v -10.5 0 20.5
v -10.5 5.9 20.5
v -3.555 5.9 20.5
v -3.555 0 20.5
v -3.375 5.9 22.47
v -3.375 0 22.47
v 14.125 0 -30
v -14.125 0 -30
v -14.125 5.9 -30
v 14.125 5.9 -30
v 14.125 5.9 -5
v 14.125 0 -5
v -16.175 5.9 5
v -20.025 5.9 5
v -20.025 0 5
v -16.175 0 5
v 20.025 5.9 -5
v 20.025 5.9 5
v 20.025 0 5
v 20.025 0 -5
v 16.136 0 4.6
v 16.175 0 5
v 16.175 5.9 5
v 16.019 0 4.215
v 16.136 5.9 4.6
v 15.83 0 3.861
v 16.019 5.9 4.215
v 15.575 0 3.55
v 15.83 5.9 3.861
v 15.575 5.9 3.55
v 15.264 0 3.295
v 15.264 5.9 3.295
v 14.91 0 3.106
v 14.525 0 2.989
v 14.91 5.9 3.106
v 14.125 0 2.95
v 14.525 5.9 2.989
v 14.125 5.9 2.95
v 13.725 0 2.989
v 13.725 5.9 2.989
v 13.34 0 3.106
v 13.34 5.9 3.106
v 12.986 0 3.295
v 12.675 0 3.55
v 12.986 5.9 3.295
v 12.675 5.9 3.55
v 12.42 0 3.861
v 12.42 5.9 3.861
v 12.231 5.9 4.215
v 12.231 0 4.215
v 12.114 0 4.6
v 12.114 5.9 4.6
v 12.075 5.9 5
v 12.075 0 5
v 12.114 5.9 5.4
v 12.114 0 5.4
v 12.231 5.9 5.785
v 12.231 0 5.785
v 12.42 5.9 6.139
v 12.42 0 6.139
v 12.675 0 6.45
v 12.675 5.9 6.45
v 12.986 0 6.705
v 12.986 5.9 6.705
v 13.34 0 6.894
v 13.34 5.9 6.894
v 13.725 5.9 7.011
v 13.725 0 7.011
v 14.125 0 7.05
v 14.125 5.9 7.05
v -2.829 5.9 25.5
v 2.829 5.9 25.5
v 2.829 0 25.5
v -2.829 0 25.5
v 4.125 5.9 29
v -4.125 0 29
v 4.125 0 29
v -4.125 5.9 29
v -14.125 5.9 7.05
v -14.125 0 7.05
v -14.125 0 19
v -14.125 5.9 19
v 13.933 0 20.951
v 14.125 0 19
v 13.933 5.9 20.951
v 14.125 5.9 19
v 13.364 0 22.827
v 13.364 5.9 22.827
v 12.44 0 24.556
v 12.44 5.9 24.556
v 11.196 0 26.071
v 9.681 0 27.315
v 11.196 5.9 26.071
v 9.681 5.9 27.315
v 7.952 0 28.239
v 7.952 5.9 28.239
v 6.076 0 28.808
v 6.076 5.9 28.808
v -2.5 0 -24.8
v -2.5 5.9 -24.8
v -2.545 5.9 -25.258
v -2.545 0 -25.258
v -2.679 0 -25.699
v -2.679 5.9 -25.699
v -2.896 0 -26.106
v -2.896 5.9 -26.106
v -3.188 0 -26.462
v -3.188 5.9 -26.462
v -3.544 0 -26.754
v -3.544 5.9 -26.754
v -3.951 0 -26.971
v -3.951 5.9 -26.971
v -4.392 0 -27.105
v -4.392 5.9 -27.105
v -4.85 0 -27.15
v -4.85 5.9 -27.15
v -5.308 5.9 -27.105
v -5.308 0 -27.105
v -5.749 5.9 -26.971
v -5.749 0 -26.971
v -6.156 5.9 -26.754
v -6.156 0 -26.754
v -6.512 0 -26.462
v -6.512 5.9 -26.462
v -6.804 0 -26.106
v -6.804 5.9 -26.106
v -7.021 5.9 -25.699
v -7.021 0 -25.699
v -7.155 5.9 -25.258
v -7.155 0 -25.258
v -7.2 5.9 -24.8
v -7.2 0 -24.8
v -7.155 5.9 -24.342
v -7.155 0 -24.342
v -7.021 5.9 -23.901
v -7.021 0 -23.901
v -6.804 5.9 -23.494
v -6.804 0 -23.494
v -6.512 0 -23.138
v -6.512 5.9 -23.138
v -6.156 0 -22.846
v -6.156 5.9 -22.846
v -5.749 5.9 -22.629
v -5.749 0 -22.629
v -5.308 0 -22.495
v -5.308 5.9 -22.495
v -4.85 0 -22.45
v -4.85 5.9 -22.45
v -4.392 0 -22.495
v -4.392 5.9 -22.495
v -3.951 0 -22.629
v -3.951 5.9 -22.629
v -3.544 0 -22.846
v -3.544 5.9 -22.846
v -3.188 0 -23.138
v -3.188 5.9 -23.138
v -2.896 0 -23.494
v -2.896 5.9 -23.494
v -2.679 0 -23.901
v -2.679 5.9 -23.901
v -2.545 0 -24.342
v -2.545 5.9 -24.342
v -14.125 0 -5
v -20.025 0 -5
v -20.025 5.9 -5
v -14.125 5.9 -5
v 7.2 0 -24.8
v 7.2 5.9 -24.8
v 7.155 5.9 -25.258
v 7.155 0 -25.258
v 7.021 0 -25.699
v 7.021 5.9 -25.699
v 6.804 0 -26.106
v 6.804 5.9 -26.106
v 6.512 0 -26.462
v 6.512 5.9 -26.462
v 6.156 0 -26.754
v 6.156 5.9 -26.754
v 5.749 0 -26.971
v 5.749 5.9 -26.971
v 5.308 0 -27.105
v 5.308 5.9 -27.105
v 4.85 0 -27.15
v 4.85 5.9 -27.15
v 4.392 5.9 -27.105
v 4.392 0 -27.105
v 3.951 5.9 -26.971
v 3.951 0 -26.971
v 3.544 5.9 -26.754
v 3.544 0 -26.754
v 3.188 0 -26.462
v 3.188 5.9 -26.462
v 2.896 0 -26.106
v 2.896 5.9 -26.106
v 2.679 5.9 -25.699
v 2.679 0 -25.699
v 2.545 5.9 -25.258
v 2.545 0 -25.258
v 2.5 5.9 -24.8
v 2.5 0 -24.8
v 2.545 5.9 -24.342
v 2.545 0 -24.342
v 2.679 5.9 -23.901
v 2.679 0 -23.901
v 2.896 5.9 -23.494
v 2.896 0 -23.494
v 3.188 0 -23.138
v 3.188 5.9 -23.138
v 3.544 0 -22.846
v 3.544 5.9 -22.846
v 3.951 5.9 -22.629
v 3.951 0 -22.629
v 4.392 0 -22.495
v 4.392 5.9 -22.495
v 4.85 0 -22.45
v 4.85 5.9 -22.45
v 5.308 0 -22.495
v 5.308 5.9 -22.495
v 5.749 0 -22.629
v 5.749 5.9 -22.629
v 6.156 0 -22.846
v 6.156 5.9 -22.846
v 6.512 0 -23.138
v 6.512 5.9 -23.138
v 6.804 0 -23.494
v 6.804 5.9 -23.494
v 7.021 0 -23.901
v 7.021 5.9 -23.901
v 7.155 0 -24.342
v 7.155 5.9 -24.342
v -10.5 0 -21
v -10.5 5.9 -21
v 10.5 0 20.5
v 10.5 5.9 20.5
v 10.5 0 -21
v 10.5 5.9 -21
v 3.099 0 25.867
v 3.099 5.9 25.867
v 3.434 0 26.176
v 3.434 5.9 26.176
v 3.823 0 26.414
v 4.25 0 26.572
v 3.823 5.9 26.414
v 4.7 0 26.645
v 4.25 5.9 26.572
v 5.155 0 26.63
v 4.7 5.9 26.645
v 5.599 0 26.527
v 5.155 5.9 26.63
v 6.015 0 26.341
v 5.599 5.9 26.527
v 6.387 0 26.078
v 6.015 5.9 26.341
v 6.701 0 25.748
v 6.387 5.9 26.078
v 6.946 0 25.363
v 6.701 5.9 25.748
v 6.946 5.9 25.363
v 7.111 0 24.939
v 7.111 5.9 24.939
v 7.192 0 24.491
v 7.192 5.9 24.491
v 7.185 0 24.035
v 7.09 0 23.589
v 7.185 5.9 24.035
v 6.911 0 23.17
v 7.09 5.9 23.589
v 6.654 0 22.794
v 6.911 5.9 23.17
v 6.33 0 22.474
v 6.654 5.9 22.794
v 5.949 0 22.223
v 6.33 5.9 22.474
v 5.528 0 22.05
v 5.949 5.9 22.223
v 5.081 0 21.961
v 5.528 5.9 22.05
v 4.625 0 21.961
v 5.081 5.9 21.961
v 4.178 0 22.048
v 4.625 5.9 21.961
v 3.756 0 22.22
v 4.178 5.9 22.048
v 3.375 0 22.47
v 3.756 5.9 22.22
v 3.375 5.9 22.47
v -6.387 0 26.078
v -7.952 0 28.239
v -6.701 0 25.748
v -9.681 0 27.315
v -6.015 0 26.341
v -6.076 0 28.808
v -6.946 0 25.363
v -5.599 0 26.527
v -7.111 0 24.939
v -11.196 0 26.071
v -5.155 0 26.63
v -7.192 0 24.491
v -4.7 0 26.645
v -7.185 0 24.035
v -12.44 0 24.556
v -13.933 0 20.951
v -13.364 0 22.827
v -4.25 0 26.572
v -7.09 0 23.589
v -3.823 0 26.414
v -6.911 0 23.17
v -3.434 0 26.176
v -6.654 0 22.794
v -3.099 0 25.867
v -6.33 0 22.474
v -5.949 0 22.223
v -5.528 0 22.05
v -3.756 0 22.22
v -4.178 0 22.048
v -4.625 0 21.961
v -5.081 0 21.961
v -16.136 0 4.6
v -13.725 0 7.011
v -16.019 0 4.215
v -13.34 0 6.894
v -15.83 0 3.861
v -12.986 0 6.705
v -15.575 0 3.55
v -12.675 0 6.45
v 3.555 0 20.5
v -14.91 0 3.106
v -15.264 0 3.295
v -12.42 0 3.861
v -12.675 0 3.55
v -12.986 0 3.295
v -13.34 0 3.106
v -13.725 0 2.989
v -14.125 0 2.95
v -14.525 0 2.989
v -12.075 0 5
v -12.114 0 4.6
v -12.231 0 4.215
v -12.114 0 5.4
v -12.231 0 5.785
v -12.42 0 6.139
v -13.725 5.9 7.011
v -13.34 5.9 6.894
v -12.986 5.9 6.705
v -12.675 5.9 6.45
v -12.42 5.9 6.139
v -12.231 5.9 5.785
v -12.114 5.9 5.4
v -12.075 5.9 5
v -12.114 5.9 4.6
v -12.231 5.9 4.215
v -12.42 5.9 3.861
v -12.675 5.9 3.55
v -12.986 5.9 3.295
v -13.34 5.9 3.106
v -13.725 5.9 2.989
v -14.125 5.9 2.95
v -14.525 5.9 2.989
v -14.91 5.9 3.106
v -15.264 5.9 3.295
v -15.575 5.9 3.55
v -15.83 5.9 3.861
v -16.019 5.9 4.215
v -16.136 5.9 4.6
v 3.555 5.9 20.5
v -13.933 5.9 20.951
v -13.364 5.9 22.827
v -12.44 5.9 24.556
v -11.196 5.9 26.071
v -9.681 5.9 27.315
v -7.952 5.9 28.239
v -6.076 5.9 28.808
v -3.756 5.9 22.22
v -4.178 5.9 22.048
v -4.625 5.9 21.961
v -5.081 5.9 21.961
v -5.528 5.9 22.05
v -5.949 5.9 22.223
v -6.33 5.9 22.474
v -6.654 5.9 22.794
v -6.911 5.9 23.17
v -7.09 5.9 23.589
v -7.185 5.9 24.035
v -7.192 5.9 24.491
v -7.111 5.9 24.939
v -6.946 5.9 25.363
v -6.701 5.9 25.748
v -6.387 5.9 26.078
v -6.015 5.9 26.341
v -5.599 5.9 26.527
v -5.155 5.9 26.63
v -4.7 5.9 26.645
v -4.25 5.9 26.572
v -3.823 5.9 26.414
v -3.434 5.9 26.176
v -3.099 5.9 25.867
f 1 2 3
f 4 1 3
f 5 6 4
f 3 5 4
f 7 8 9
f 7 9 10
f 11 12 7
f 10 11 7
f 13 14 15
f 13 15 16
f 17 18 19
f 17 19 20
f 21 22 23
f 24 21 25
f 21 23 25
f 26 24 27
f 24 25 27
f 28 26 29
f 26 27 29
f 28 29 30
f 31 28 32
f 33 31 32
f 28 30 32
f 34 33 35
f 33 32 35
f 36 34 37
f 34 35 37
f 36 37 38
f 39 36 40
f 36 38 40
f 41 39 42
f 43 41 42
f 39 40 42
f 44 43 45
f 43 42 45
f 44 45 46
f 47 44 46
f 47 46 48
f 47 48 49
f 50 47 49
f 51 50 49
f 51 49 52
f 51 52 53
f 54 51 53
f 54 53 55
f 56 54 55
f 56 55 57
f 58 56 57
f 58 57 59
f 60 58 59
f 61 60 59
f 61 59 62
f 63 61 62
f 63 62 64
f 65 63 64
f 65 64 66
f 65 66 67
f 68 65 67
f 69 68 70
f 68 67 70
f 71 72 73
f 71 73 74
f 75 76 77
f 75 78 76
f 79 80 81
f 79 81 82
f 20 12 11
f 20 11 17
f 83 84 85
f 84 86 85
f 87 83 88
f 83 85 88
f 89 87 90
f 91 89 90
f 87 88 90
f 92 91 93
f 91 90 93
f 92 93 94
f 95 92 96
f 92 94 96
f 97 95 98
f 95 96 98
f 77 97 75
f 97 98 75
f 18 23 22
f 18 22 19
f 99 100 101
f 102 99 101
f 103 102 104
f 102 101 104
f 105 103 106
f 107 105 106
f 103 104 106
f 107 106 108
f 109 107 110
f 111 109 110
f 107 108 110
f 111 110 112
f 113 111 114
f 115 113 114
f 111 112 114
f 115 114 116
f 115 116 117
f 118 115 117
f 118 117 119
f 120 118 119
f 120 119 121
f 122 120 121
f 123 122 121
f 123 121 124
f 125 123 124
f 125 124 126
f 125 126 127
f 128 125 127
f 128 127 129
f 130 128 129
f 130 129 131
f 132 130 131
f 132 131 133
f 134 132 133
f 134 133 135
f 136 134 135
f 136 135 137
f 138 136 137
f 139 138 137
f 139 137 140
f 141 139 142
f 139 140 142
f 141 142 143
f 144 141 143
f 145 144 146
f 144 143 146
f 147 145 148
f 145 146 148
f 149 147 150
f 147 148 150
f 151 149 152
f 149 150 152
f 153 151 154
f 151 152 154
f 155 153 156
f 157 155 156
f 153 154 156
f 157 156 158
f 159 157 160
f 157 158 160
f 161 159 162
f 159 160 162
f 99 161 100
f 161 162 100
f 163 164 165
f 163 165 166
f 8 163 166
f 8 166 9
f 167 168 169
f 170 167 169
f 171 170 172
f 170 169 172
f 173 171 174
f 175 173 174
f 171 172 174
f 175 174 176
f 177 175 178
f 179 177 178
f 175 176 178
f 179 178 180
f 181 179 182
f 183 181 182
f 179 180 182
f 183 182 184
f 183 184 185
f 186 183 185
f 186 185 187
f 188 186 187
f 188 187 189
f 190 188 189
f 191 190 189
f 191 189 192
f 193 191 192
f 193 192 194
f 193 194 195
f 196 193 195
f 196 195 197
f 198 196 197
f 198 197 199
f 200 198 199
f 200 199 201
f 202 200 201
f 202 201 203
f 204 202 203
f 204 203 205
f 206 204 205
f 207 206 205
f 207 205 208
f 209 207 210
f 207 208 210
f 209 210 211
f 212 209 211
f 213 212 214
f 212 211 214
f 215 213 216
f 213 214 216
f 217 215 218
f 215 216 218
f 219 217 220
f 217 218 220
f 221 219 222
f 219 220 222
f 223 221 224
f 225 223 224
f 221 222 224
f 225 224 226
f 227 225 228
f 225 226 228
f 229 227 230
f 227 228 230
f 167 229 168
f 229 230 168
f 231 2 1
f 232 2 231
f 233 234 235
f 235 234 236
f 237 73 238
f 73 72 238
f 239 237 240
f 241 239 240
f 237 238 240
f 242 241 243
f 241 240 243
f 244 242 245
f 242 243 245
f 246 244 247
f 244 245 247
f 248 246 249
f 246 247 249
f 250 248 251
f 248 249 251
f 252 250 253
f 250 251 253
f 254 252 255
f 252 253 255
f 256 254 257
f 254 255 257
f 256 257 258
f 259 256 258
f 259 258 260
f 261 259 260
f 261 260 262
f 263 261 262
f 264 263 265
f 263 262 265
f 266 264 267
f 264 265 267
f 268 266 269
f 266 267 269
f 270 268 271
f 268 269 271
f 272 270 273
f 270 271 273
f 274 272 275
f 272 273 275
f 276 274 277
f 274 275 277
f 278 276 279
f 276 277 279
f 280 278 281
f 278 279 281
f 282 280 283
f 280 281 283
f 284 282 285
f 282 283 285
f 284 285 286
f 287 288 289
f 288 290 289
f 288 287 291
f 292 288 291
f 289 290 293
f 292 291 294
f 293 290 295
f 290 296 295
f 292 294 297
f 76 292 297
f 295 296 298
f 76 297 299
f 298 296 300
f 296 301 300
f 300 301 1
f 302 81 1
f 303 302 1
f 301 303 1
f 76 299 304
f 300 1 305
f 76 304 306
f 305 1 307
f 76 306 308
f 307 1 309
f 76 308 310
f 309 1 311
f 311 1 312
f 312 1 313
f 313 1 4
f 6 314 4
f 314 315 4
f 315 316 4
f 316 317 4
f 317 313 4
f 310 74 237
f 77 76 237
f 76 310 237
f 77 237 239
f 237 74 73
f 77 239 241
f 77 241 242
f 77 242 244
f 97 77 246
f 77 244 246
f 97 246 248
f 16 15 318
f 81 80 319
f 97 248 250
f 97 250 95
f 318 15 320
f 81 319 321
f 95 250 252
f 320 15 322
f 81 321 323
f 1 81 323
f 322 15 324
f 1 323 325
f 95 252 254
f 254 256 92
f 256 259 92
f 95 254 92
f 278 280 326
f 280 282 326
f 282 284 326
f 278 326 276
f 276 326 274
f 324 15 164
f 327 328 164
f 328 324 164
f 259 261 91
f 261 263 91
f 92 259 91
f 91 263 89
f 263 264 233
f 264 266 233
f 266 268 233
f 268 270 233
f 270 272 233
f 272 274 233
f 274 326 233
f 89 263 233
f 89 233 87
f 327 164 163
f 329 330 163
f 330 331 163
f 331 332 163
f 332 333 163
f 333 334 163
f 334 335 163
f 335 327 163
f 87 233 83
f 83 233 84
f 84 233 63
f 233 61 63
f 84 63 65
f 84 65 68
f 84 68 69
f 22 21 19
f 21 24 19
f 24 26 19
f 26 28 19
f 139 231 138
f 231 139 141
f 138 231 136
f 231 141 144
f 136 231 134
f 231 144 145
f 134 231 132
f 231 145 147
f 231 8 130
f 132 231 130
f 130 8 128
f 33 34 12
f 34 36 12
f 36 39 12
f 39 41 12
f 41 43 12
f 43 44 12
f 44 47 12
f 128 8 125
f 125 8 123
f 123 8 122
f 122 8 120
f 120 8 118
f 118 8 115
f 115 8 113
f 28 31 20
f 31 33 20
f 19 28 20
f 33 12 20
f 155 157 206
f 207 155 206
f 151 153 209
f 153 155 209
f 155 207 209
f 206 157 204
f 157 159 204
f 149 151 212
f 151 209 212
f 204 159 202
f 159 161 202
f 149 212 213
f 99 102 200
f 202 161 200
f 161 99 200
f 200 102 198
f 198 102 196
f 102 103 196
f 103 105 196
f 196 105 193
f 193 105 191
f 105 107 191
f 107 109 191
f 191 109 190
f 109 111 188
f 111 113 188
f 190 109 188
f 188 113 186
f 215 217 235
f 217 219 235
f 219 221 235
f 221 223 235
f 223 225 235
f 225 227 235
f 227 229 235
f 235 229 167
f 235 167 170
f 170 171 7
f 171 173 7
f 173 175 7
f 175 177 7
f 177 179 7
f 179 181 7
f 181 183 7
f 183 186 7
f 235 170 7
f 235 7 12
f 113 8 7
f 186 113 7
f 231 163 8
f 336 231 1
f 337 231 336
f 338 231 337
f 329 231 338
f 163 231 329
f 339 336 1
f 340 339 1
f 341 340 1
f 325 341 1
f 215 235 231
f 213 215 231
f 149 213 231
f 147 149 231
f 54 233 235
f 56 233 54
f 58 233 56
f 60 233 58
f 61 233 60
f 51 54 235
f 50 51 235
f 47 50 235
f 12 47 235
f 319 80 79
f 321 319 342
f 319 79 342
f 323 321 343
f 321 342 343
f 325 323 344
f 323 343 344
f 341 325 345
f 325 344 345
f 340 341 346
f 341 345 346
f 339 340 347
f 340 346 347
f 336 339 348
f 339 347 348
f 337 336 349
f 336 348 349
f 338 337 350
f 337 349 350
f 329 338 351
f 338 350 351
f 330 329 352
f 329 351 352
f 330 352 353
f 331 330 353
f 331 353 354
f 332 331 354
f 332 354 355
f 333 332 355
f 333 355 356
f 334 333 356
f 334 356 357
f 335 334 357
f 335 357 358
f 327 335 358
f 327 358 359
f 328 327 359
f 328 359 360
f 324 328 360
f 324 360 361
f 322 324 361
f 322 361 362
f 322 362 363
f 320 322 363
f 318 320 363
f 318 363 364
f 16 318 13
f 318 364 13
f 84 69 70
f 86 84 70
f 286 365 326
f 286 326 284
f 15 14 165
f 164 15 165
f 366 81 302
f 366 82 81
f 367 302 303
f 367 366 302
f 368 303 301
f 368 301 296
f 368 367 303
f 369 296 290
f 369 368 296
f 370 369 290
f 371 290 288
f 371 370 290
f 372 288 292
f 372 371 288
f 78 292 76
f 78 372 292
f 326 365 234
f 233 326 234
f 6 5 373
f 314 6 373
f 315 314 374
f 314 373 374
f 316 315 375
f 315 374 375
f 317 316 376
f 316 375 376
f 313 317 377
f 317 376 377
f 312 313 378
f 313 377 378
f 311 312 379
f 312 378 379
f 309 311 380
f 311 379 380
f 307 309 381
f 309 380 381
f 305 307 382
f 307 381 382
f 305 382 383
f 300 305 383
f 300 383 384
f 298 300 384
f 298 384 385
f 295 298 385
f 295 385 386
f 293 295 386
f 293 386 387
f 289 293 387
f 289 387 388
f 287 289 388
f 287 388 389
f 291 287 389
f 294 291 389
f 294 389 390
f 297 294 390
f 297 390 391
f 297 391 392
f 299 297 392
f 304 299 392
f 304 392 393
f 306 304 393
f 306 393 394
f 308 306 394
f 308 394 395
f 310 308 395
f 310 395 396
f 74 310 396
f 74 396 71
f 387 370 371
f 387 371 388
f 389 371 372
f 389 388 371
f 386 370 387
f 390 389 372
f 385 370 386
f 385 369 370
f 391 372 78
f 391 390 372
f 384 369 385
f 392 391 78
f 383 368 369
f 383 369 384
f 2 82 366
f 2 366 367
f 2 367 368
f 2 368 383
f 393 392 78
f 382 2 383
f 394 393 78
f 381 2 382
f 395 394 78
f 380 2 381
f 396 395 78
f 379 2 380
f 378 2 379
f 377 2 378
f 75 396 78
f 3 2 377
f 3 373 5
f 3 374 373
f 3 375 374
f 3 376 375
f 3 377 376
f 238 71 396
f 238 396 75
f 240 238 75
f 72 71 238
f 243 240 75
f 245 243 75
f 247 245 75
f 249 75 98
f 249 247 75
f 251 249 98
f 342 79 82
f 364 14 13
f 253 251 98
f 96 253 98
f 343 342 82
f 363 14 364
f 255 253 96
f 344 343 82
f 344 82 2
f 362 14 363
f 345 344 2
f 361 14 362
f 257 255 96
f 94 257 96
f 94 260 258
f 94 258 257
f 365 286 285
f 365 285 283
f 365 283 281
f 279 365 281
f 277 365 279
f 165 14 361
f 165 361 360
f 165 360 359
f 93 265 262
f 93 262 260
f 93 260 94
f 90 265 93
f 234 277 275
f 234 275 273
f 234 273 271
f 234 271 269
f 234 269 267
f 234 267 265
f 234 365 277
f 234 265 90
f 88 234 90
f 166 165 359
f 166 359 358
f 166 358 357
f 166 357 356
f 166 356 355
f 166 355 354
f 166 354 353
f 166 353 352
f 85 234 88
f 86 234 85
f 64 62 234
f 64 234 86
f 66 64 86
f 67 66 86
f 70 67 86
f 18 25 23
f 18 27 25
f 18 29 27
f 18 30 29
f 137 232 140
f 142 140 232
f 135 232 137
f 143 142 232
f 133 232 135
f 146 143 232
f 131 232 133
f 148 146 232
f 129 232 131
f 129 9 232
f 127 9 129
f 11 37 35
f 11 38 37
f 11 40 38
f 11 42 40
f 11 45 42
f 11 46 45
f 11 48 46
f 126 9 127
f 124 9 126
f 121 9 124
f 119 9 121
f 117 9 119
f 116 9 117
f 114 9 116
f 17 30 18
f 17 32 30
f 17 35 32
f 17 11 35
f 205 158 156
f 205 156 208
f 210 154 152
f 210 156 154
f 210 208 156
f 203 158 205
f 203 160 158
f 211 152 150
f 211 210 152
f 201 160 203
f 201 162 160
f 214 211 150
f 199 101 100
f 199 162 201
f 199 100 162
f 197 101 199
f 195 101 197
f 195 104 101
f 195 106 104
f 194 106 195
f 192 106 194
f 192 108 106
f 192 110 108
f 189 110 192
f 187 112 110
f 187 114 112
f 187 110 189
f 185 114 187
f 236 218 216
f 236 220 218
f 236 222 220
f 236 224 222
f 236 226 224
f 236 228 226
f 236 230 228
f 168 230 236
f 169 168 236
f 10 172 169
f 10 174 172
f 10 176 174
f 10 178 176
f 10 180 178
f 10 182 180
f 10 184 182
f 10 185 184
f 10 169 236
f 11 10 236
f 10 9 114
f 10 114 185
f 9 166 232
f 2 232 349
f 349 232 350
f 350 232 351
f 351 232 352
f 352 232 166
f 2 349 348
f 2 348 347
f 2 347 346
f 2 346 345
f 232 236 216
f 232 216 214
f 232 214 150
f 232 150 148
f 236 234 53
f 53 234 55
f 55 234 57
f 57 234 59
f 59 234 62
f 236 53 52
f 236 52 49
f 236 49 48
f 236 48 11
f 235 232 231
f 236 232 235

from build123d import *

# Parameters (mm, degrees)
SKETCH1_W           = 28.25
SKETCH1_H           = 58
BOSS_EXTRUDE1_DEPTH = 5.9
CUT_EXTRUDE1_REACH  = 7.9
SKETCH2_R           = 2.35
SKETCH2_W           = 20
SKETCH2_H           = 40.5
SKETCH3_W           = 5.9
SKETCH3_H           = 10
BOSS_EXTRUDE2_DEPTH = 5.9
CUT_EXTRUDE2_REACH  = 7.9
SKETCH4_R           = 2.05
CUT_EXTRUDE3_DEPTH  = 10
SKETCH6_W           = 28.25
SKETCH6_H           = 5.9
BOSS_EXTRUDE3_DEPTH = 1
FILLET1_R           = 10
CUT_EXTRUDE4_REACH  = 7.9
SKETCH7_W           = 21
SKETCH7_H           = 41.5


with BuildPart() as part:
    # Sketch1 → Boss-Extrude1 (new body)
    with BuildSketch(Plane(origin=(0, 0, 0), x_dir=(1, 0, 0), z_dir=(0, 1, 0))):
        with Locations((0, 1)):
            Rectangle(SKETCH1_W, SKETCH1_H)
    extrude(amount=BOSS_EXTRUDE1_DEPTH)

    # Sketch2 → Cut-Extrude1 (cut, up to next)
    with BuildSketch(Plane(origin=(0, 5.9, 0), x_dir=(1, 0, 0), z_dir=(0, 1, 0)), mode=Mode.PRIVATE) as cut_extrude1_sk1:
        with Locations((-4.85, -24.3)):
            Circle(SKETCH2_R)
    cut_extrude1_tool1 = extrude(cut_extrude1_sk1.sketch, amount=-CUT_EXTRUDE1_REACH, mode=Mode.PRIVATE) & part.part
    add(cut_extrude1_tool1.solids().sort_by_distance((-4.85, 5.9, 24.3))[0], mode=Mode.SUBTRACT)
    # Sketch2 → Cut-Extrude1 (cut, up to next)
    with BuildSketch(Plane(origin=(0, 5.9, 0), x_dir=(1, 0, 0), z_dir=(0, 1, 0)), mode=Mode.PRIVATE) as cut_extrude1_sk2:
        with Locations((-4.85, 24.8)):
            Circle(SKETCH2_R)
    cut_extrude1_tool2 = extrude(cut_extrude1_sk2.sketch, amount=-CUT_EXTRUDE1_REACH, mode=Mode.PRIVATE) & part.part
    add(cut_extrude1_tool2.solids().sort_by_distance((-4.85, 5.9, -24.8))[0], mode=Mode.SUBTRACT)
    # Sketch2 → Cut-Extrude1 (cut, up to next)
    with BuildSketch(Plane(origin=(0, 5.9, 0), x_dir=(1, 0, 0), z_dir=(0, 1, 0)), mode=Mode.PRIVATE) as cut_extrude1_sk3:
        with Locations((4.85, 24.8)):
            Circle(SKETCH2_R)
    cut_extrude1_tool3 = extrude(cut_extrude1_sk3.sketch, amount=-CUT_EXTRUDE1_REACH, mode=Mode.PRIVATE) & part.part
    add(cut_extrude1_tool3.solids().sort_by_distance((4.85, 5.9, -24.8))[0], mode=Mode.SUBTRACT)
    # Sketch2 → Cut-Extrude1 (cut, up to next)
    with BuildSketch(Plane(origin=(0, 5.9, 0), x_dir=(1, 0, 0), z_dir=(0, 1, 0)), mode=Mode.PRIVATE) as cut_extrude1_sk4:
        with Locations((4.85, -24.3)):
            Circle(SKETCH2_R)
    cut_extrude1_tool4 = extrude(cut_extrude1_sk4.sketch, amount=-CUT_EXTRUDE1_REACH, mode=Mode.PRIVATE) & part.part
    add(cut_extrude1_tool4.solids().sort_by_distance((4.85, 5.9, 24.3))[0], mode=Mode.SUBTRACT)
    # Sketch2 → Cut-Extrude1 (cut, up to next)
    with BuildSketch(Plane(origin=(0, 5.9, 0), x_dir=(1, 0, 0), z_dir=(0, 1, 0)), mode=Mode.PRIVATE) as cut_extrude1_sk5:
        with Locations((0, 0.25)):
            Rectangle(SKETCH2_W, SKETCH2_H)
    cut_extrude1_tool5 = extrude(cut_extrude1_sk5.sketch, amount=-CUT_EXTRUDE1_REACH, mode=Mode.PRIVATE) & part.part
    add(cut_extrude1_tool5.solids().sort_by_distance((0, 5.9, -0.25))[0], mode=Mode.SUBTRACT)

    # Sketch3 → Boss-Extrude2 (add)
    with BuildSketch(Plane(origin=(0, 5.9, 0), x_dir=(1, 0, 0), z_dir=(0, 1, 0))):
        with Locations((-17.075, 0)):
            Rectangle(SKETCH3_W, SKETCH3_H)
        with Locations((17.075, 0)):
            Rectangle(SKETCH3_W, SKETCH3_H)
    extrude(amount=-BOSS_EXTRUDE2_DEPTH)

    # Sketch4 → Cut-Extrude2 (cut, up to next)
    with BuildSketch(Plane(origin=(0, 5.9, 0), x_dir=(1, 0, 0), z_dir=(0, 1, 0)), mode=Mode.PRIVATE) as cut_extrude2_sk1:
        with Locations((-14.125, -5)):
            Circle(SKETCH4_R)
    cut_extrude2_tool1 = extrude(cut_extrude2_sk1.sketch, amount=-CUT_EXTRUDE2_REACH, mode=Mode.PRIVATE) & part.part
    add(cut_extrude2_tool1.solids().sort_by_distance((-14.125, 5.9, 5))[0], mode=Mode.SUBTRACT)
    # Sketch4 → Cut-Extrude2 (cut, up to next)
    with BuildSketch(Plane(origin=(0, 5.9, 0), x_dir=(1, 0, 0), z_dir=(0, 1, 0)), mode=Mode.PRIVATE) as cut_extrude2_sk2:
        with Locations((14.125, -5)):
            Circle(SKETCH4_R)
    cut_extrude2_tool2 = extrude(cut_extrude2_sk2.sketch, amount=-CUT_EXTRUDE2_REACH, mode=Mode.PRIVATE) & part.part
    add(cut_extrude2_tool2.solids().sort_by_distance((14.125, 5.9, 5))[0], mode=Mode.SUBTRACT)

    # Sketch5 → Cut-Extrude3 (cut)
    with BuildSketch(Plane(origin=(0, 5.9, 0), x_dir=(1, 0, 0), z_dir=(0, 1, 0))):
        Polygon((3.1, -20), (3.6, -20), (3.1, -25.5), (-3.1, -25.5), (-3.6, -20), (-3.1, -20), (0, -20), align=None)
    extrude(amount=-CUT_EXTRUDE3_DEPTH, mode=Mode.SUBTRACT)

    # Sketch6 → Boss-Extrude3 (add)
    with BuildSketch(Plane.XY.offset(28)):
        with Locations((0, 2.95)):
            Rectangle(SKETCH6_W, SKETCH6_H)
    extrude(amount=BOSS_EXTRUDE3_DEPTH)

    # Fillet1
    fillet1_edges = [part.edges().sort_by_distance(p)[0] for p in [
        (-14.125, 2.95, 29),
        (14.125, 2.95, 29),
    ]]
    fillet(fillet1_edges, radius=FILLET1_R)

    # Sketch7 → Cut-Extrude4 (cut, up to next)
    with BuildSketch(Plane(origin=(0, 5.9, 0), x_dir=(1, 0, 0), z_dir=(0, 1, 0)), mode=Mode.PRIVATE) as cut_extrude4_sk1:
        with Locations((0, 0.25)):
            Rectangle(SKETCH7_W, SKETCH7_H)
    cut_extrude4_tool1 = extrude(cut_extrude4_sk1.sketch, amount=-CUT_EXTRUDE4_REACH, mode=Mode.PRIVATE) & part.part
    add(cut_extrude4_tool1.solids().sort_by_distance((0, 5.9, -0.25))[0], mode=Mode.SUBTRACT)


solid = part.part
